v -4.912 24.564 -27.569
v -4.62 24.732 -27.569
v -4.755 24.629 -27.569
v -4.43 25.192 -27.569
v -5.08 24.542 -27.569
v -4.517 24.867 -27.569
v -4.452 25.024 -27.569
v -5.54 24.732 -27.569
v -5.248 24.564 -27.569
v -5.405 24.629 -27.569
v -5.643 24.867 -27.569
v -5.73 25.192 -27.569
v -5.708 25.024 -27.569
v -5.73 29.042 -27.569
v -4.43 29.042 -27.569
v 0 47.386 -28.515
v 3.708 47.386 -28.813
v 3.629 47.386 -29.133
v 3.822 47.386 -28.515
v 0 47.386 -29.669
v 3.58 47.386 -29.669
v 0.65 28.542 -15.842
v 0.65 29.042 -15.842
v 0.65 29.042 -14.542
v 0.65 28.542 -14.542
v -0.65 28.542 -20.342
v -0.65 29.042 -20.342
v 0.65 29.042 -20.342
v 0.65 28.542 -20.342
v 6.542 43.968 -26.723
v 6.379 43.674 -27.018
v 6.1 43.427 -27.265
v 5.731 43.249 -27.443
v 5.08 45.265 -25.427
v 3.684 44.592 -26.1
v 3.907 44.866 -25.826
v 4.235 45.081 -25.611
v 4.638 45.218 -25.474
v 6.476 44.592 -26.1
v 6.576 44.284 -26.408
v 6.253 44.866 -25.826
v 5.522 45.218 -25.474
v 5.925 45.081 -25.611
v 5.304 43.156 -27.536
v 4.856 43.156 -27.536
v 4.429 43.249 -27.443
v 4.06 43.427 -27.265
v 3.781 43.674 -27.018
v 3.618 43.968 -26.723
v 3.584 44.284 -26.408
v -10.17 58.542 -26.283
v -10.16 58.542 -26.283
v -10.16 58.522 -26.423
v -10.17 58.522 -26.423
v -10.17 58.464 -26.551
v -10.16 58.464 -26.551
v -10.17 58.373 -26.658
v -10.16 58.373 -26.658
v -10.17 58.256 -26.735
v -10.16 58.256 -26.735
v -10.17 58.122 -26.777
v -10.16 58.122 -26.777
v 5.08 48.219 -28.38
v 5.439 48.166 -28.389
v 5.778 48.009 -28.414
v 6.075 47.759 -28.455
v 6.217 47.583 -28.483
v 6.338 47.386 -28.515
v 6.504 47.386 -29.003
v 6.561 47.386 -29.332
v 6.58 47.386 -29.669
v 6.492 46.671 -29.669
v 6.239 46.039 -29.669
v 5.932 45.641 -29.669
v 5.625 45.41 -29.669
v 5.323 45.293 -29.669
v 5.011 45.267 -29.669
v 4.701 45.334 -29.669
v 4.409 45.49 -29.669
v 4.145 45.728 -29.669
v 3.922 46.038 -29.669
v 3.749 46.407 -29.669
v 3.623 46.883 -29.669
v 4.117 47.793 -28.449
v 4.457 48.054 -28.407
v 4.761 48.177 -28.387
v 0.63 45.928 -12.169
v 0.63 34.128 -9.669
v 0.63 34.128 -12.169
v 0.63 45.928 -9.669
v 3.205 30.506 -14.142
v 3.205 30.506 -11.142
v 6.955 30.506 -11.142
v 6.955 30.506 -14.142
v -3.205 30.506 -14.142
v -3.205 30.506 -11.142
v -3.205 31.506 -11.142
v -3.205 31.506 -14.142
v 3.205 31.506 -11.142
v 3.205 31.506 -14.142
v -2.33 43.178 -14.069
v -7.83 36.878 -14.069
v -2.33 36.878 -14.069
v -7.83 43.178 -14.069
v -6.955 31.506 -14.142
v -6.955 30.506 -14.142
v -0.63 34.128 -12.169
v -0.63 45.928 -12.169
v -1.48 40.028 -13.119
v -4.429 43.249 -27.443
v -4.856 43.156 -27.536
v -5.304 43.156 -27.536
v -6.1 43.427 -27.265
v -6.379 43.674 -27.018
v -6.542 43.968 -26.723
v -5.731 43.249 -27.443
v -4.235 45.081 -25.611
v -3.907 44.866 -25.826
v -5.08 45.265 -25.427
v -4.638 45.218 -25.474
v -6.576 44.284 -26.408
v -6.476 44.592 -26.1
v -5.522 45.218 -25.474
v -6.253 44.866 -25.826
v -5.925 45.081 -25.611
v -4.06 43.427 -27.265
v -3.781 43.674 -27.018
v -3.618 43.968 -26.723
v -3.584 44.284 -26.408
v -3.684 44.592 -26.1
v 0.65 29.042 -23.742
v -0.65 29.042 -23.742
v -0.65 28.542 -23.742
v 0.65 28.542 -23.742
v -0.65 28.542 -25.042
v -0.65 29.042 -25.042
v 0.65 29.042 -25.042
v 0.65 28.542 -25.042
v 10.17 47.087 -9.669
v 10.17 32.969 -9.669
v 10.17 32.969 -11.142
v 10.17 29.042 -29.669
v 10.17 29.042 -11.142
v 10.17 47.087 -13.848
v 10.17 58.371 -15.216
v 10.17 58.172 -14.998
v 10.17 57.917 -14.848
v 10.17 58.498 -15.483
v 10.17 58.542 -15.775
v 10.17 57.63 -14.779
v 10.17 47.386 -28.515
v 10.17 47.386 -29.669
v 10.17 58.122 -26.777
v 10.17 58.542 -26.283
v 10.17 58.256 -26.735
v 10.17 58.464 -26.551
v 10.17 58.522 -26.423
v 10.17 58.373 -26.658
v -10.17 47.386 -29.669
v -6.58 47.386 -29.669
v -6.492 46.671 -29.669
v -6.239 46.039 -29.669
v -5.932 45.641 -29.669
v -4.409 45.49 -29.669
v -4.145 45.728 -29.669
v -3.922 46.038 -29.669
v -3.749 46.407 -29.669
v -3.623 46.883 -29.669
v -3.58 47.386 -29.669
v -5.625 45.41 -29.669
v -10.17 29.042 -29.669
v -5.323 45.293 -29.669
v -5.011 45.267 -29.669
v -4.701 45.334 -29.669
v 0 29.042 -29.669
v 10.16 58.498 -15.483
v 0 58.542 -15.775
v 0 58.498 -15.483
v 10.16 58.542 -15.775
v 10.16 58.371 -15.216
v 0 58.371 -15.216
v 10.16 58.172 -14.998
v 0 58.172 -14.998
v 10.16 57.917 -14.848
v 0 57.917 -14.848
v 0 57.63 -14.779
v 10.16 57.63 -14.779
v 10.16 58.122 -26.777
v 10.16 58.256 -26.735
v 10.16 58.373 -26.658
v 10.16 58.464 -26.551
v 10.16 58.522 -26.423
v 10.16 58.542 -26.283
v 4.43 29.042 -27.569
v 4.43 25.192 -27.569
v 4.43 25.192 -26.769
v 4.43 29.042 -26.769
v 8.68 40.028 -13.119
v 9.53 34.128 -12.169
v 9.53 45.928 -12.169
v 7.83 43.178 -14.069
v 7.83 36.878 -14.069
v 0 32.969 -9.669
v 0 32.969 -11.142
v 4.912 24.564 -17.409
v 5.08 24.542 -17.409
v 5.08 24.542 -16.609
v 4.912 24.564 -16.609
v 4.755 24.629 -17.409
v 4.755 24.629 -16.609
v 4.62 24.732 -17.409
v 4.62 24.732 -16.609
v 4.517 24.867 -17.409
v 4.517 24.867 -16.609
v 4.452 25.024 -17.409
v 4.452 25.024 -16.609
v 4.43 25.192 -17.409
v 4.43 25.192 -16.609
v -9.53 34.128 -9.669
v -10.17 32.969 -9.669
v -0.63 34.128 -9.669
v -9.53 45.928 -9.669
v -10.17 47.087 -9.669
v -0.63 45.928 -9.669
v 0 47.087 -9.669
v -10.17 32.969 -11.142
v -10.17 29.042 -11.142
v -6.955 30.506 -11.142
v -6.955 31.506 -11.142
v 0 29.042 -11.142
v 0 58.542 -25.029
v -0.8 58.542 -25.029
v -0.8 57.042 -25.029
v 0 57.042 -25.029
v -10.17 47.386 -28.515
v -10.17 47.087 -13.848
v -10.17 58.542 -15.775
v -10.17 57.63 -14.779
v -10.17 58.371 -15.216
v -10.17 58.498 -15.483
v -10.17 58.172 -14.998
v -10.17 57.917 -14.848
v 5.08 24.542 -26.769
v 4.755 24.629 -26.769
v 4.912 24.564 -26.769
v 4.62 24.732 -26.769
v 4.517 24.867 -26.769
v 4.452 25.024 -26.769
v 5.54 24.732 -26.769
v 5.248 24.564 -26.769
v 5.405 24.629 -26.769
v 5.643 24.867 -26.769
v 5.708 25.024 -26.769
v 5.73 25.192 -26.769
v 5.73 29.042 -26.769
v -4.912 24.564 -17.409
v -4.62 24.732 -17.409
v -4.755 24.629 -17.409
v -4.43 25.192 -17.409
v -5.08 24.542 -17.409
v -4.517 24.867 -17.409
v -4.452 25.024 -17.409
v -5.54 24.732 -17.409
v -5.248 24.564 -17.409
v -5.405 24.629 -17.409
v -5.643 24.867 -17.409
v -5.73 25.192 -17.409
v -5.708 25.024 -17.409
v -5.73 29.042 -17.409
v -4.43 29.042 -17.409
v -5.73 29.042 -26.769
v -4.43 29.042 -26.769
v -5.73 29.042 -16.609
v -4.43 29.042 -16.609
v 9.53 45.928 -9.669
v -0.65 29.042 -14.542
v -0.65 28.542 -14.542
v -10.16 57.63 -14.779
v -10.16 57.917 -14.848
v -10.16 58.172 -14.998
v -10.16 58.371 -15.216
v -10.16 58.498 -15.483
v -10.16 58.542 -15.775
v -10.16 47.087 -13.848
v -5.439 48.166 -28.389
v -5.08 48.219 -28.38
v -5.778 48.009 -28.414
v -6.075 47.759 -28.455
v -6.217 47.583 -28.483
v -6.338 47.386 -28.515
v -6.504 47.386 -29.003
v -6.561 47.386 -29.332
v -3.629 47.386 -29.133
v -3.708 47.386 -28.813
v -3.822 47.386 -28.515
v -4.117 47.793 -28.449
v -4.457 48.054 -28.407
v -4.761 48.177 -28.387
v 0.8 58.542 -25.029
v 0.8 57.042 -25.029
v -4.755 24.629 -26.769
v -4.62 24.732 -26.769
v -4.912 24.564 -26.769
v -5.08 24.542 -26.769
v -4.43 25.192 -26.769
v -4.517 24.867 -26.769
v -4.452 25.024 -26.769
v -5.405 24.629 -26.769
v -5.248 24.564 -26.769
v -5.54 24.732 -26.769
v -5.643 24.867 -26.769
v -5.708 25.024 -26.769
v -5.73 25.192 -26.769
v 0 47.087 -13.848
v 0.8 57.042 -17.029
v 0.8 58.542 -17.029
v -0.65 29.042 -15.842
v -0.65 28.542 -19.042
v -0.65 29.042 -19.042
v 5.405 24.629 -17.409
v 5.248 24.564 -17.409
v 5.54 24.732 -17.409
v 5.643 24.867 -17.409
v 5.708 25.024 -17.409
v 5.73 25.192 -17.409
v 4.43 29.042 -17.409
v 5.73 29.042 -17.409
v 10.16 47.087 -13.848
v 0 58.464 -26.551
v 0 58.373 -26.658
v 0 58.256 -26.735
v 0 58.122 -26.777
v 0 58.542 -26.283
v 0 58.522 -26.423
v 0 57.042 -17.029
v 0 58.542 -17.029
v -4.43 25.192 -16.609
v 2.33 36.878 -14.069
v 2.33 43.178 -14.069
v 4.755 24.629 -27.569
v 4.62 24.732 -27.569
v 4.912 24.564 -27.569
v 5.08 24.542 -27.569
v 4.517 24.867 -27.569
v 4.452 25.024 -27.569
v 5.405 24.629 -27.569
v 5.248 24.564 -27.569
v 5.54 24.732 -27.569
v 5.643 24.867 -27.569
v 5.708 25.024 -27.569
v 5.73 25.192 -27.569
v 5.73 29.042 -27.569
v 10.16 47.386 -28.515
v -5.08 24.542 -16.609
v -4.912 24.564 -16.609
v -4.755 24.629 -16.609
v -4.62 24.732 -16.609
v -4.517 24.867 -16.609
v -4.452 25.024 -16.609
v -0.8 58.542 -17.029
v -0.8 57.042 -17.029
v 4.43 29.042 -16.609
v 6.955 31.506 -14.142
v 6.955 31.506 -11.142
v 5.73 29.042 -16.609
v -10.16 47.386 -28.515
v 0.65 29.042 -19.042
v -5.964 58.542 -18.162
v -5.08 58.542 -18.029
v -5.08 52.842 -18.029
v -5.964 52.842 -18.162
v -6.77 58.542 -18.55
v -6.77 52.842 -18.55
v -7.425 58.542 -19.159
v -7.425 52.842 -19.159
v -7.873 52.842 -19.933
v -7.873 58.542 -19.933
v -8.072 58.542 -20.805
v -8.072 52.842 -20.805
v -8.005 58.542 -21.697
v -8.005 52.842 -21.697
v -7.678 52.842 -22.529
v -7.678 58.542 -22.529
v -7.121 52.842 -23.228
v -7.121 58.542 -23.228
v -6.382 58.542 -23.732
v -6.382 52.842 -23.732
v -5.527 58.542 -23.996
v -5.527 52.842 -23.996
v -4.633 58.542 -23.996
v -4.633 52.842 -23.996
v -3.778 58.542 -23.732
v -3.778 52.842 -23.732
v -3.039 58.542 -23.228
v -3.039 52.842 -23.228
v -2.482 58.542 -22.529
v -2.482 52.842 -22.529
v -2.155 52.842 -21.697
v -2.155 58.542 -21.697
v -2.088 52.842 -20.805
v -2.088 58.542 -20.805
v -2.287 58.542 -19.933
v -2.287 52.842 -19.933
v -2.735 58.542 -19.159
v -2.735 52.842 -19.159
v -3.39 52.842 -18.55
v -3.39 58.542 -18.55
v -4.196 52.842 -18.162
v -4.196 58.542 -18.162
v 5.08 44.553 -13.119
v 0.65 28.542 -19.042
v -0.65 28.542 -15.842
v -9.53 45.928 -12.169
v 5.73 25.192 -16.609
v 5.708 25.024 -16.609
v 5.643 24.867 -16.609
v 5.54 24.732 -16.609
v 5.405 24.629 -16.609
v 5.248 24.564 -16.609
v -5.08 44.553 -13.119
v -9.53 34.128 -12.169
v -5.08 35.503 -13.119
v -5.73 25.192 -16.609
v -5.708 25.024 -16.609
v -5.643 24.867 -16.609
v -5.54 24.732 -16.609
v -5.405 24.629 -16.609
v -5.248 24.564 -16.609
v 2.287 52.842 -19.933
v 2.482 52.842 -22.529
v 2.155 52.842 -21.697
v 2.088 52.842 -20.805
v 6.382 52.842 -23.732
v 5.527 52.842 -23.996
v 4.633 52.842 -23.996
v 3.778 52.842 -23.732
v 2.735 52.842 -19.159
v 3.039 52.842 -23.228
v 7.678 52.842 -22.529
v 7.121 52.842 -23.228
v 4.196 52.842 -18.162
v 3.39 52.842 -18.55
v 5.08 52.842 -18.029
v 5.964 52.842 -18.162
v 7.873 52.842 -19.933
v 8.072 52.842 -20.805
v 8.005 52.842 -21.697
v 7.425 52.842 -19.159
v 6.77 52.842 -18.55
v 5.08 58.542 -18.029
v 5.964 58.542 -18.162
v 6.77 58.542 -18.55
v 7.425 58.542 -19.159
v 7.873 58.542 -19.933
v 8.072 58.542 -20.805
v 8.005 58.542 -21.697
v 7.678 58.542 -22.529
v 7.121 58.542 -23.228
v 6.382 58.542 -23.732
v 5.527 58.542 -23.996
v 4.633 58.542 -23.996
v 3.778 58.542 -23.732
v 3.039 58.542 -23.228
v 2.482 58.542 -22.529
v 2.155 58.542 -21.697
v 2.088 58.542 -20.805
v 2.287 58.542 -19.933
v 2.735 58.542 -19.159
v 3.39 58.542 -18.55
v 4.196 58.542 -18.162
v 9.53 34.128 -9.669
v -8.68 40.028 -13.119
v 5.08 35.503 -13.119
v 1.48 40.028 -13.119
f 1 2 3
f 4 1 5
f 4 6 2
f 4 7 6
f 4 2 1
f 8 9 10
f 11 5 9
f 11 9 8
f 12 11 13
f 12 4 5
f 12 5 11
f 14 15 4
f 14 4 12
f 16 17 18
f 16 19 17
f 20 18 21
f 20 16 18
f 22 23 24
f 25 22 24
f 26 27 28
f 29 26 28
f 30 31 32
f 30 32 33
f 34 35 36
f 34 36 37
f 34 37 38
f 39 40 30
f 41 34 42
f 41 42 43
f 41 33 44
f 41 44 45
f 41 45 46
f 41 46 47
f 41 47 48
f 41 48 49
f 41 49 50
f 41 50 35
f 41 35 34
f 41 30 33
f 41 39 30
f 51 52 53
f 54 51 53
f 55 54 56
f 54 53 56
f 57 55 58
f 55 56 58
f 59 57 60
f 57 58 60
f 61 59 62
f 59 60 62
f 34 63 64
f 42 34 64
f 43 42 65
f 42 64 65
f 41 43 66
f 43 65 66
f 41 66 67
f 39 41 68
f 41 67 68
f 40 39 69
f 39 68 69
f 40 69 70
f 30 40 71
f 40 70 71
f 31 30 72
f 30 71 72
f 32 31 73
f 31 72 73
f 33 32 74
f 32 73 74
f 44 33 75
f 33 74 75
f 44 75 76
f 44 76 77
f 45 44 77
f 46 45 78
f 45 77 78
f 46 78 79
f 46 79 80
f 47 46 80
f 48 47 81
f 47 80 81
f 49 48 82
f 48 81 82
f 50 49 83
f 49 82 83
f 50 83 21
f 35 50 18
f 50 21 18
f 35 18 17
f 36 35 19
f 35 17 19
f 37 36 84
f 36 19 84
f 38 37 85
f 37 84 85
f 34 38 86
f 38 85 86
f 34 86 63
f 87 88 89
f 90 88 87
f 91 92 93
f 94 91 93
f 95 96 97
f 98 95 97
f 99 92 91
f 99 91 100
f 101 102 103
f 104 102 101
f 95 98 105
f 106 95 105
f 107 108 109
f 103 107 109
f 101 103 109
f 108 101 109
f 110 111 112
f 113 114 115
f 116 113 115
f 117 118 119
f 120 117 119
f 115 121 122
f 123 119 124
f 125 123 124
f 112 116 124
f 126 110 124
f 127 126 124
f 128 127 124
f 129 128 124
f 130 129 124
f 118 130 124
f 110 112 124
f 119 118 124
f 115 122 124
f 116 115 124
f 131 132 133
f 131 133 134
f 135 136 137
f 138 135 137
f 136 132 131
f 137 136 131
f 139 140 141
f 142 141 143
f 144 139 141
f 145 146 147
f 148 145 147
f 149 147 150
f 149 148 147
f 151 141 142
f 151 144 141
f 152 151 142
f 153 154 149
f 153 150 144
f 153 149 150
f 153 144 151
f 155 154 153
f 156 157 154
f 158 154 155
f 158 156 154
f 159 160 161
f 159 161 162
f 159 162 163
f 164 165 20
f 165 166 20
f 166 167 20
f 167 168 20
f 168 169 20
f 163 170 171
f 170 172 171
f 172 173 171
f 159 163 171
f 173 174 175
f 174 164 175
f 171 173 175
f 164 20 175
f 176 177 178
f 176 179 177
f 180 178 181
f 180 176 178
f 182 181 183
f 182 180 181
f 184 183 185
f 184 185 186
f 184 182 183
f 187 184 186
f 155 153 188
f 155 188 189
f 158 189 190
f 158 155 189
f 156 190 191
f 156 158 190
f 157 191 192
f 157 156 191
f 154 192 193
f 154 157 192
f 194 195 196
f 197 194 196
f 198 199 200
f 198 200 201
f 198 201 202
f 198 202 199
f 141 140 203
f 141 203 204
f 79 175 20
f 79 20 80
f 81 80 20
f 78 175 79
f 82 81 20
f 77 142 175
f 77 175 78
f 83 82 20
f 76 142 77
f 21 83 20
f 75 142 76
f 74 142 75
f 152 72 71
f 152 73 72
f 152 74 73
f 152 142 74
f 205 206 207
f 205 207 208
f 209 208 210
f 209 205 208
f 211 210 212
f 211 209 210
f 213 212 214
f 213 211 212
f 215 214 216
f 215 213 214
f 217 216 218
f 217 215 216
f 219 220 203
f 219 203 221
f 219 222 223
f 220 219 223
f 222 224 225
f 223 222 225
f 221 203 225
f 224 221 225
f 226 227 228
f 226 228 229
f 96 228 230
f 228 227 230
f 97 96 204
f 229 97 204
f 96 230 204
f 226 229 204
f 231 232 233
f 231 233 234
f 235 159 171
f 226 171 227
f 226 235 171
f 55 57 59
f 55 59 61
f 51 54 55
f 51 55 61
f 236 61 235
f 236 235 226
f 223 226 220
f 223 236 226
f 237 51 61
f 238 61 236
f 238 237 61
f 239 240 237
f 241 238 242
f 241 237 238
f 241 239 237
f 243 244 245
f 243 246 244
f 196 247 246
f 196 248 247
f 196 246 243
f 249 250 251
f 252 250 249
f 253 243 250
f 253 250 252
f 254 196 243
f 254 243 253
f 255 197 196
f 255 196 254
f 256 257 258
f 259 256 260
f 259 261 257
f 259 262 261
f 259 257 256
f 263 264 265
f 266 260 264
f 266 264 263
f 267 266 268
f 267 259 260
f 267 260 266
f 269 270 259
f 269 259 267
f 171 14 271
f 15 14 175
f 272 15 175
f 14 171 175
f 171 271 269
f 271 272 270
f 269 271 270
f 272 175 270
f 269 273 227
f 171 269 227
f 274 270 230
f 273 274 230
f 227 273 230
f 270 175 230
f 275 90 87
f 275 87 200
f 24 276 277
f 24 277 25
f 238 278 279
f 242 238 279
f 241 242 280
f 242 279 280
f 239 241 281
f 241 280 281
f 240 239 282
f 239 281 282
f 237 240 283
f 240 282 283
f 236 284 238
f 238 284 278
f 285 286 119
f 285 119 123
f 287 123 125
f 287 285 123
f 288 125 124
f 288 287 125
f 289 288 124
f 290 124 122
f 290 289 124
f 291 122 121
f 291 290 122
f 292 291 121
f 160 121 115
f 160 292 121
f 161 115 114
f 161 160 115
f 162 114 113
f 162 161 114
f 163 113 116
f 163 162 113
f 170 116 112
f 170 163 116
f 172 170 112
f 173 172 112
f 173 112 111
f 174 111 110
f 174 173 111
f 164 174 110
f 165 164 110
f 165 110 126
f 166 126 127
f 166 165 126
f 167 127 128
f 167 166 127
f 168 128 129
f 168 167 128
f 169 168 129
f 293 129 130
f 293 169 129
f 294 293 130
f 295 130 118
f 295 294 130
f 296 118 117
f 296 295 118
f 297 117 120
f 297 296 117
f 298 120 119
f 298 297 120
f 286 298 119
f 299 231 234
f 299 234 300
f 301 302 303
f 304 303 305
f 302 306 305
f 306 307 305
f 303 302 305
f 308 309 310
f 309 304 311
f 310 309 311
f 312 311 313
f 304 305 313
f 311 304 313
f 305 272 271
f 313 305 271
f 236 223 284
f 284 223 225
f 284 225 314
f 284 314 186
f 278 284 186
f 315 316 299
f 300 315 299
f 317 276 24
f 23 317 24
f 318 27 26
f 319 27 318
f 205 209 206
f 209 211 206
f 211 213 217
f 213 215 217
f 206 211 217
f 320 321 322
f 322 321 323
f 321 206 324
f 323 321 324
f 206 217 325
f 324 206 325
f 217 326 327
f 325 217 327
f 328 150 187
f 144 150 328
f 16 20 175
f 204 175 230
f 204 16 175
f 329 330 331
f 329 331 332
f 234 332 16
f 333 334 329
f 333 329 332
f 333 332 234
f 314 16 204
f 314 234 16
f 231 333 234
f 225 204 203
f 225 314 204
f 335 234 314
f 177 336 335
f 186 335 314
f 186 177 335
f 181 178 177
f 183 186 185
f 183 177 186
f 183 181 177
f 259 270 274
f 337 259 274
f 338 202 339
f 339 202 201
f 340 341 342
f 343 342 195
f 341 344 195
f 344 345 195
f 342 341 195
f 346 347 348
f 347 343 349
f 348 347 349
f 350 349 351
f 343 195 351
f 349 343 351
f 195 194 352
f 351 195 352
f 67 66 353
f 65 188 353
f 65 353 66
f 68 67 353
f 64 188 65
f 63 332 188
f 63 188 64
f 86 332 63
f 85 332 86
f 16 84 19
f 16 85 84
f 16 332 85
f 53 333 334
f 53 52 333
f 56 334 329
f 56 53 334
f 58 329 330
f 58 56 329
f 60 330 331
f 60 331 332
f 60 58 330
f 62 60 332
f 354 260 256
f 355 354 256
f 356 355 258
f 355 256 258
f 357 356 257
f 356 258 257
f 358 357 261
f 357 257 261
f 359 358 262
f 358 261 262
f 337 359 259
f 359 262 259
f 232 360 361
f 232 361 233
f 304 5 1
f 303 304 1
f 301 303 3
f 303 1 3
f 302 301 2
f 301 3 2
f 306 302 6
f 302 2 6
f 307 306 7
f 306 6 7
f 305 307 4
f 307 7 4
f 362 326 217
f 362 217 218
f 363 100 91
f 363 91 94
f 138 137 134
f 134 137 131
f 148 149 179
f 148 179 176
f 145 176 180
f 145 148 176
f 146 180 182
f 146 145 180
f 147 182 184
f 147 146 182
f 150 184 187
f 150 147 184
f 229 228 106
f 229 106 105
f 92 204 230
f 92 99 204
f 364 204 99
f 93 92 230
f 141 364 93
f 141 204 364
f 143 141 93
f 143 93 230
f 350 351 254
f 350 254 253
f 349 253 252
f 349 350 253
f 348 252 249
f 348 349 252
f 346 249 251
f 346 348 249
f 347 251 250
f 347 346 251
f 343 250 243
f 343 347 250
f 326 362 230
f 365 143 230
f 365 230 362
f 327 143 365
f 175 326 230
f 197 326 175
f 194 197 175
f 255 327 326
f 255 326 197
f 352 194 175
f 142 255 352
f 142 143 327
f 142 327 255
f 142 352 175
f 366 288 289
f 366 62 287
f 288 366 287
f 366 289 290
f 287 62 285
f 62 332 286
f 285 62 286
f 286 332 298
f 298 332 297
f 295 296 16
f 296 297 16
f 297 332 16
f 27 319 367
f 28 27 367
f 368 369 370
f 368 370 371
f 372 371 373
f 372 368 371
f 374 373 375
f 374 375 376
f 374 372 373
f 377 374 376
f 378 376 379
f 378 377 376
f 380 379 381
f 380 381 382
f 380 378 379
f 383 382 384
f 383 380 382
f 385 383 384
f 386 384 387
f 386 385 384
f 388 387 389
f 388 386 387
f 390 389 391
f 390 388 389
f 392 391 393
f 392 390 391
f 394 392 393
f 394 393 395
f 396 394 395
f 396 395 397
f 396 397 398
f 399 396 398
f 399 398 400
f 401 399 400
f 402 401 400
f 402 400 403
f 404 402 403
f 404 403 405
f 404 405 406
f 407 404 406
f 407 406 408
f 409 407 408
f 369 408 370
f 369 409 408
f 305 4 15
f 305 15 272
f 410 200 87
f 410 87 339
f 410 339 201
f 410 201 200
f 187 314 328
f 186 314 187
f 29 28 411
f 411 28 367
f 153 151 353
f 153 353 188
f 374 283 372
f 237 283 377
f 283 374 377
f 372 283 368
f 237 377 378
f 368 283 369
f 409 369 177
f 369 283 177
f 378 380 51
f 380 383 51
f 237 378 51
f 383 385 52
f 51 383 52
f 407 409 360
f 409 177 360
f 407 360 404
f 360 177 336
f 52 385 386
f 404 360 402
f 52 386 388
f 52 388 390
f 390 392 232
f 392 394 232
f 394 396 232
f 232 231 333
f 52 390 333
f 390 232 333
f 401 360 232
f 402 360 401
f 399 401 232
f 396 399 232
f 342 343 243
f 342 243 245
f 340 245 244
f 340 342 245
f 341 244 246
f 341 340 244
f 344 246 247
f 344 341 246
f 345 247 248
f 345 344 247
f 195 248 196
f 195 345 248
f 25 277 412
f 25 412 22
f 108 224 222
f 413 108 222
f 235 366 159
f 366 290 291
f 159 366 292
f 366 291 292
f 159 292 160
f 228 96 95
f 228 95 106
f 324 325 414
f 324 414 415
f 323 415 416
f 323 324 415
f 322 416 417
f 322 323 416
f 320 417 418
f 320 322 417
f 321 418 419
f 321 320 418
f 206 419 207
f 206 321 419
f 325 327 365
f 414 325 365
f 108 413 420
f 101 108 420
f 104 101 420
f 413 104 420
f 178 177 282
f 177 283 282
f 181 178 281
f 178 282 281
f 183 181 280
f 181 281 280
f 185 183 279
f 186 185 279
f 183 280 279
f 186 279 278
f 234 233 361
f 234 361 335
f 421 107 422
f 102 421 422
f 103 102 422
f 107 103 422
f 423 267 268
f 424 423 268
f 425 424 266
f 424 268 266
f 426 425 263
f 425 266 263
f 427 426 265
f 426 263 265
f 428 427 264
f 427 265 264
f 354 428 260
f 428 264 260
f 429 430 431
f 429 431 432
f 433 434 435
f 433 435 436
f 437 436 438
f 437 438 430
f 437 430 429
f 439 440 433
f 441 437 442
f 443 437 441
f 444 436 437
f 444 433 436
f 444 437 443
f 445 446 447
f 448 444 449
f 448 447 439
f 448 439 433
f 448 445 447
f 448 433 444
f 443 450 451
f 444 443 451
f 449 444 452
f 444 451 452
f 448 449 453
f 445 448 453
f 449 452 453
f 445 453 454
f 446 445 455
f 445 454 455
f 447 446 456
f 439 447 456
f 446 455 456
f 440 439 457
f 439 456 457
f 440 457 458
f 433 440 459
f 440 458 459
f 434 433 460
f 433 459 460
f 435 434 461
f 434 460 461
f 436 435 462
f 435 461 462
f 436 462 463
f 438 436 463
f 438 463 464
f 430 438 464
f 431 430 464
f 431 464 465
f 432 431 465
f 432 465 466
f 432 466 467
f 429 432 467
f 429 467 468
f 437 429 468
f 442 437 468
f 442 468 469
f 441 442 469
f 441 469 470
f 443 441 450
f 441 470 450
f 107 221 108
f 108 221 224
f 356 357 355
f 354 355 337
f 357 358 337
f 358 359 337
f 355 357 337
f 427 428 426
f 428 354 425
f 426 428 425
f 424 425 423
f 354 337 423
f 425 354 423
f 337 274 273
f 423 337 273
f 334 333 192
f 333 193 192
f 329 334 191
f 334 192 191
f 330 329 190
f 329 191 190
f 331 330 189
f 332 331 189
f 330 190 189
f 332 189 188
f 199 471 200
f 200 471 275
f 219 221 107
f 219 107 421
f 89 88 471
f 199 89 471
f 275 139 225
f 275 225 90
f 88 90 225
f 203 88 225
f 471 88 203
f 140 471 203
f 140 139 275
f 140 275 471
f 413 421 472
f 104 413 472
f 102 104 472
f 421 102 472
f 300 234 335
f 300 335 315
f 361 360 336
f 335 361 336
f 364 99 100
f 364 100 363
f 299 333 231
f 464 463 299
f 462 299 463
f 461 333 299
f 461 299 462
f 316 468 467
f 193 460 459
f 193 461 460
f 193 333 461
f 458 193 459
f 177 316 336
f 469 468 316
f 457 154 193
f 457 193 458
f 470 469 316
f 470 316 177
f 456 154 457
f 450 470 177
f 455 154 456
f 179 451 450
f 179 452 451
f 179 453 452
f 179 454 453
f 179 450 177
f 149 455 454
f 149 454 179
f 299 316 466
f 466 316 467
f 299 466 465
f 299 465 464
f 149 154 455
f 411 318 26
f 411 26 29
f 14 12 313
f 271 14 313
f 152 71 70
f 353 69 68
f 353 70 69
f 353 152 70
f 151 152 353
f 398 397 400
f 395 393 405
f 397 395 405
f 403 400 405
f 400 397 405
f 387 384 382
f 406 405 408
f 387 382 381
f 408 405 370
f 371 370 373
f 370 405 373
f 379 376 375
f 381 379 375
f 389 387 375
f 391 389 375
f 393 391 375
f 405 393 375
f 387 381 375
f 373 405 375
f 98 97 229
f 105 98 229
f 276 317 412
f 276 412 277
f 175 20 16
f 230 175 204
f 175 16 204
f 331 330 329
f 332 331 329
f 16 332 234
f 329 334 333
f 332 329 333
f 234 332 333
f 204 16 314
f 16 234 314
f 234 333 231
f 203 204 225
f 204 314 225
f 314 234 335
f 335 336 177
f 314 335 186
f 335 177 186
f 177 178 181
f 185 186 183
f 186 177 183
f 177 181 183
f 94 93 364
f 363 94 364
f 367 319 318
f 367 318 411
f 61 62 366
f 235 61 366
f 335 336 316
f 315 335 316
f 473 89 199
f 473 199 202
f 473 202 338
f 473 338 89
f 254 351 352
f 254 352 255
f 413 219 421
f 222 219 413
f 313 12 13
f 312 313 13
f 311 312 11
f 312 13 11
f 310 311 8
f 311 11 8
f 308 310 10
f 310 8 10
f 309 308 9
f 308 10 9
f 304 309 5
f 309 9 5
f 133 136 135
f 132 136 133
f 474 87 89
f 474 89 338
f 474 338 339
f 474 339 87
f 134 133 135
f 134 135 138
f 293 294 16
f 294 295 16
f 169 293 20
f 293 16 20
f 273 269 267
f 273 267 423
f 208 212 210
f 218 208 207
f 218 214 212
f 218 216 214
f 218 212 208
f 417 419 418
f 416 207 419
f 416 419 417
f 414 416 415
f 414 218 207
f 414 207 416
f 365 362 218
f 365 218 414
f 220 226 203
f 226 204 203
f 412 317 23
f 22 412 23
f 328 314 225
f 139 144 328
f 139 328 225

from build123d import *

# Parameters (mm, degrees)
BOSS_EXTRUDE1_DEPTH   = 10.16
SKETCH2_W             = 8.9
SKETCH2_H             = 11.8
CUT_EXTRUDE1_DEPTH    = 2.5
FILLET1_R             = 0.5
FILLET2_R             = 1
SKETCH5_R             = 3
CUT_EXTRUDE2_DEPTH    = 5.7
SKETCH7_W             = 1.3
SKETCH7_H             = 0.8
BOSS_EXTRUDE2_DEPTH   = 4.5
CUT_EXTRUDE5_START    = -10.96
CUT_EXTRUDE5_DEPTH    = 10.96
SKETCH10_R            = 1.5
CUT_EXTRUDE6_DEPTH    = 4.5
SKETCH13_W            = 3.75
SKETCH13_H            = 1
CUT_EXTRUDE8_DEPTH    = 3
SKETCH11_W            = 1.6
SKETCH11_H            = 8
CUT_EXTRUDE7_DEPTH    = 1.5
SKETCH12_W            = 1.3
SKETCH12_H            = 1.3
BOSS_EXTRUDE3_DEPTH   = 0.5
BOSS_EXTRUDE3_2_DEPTH = 0.5
BOSS_EXTRUDE3_3_DEPTH = 0.5
BOSS_EXTRUDE4_START   = 0.01
BOSS_EXTRUDE4_DEPTH   = 0.01
BOSS_EXTRUDE5_DEPTH   = 0.01


# Read off the part's stored shape, not the designer's step: Cut-Extrude5
with BuildPart() as part:
    # Sketch1 → Boss-Extrude1 (new body)
    with BuildSketch(Plane(origin=(0, 0, 0), x_dir=(0, 0, -1), z_dir=(1, 0, 0))):
        Polygon((9.66921347, 32.969152597), (9.66921347, 47.086783372), (13.84750154, 47.086783372), (14.859335014, 58.541856165), (26.70903057, 58.541856165), (28.514863985, 47.386490611), (29.66921347, 47.386490611), (29.66921347, 29.041856165), (11.142277404, 29.041856165), (11.142277404, 32.969152597), align=None)
    extrude(amount=BOSS_EXTRUDE1_DEPTH)

    # Sketch2 → Cut-Extrude1 (cut)
    with BuildSketch(Plane.XY.offset(-9.66921347)):
        with Locations((5.08, 40.027967985)):
            Rectangle(SKETCH2_W, SKETCH2_H)
    extrude(amount=-CUT_EXTRUDE1_DEPTH, mode=Mode.SUBTRACT)

    # Sketch3 → Cut-Loft1 section 0
    with BuildSketch(Plane.XY.offset(-12.16921347)):
        with BuildLine():
            Line((9.53, 34.127967985), (9.53, 45.927967985))
            Line((9.53, 45.927967985), (0.63, 45.927967985))
            Line((0.63, 45.927967985), (0.63, 34.127967985))
            Line((0.63, 34.127967985), (9.53, 34.127967985))
        make_face()
    # Sketch4 → Cut-Loft1 section 1
    with BuildSketch(Plane.XY.offset(-14.06921347)):
        with BuildLine():
            Line((2.33, 36.877967985), (7.83, 36.877967985))
            Line((7.83, 36.877967985), (7.83, 43.177967985))
            Line((7.83, 43.177967985), (2.33, 43.177967985))
            Line((2.33, 43.177967985), (2.33, 36.877967985))
        make_face()
    loft(mode=Mode.SUBTRACT)

    # Fillet1
    fillet1_edges = [part.edges().sort_by_distance(p)[0] for p in [
        (5.08, 58.541856165, -26.70903057),
    ]]
    fillet(fillet1_edges, radius=FILLET1_R)

    # Fillet2
    fillet2_edges = [part.edges().sort_by_distance(p)[0] for p in [
        (5.08, 58.541856165, -14.859335014),
    ]]
    fillet(fillet2_edges, radius=FILLET2_R)

    # Sketch5 → Cut-Extrude2 (cut)
    with BuildSketch(Plane(origin=(0, 58.541856165, 0), x_dir=(1, 0, 0), z_dir=(0, 1, 0))):
        with Locations(Location((5.08, 21.02917987, 0), (0, 0, 270))):
            Circle(SKETCH5_R)
    extrude(amount=-CUT_EXTRUDE2_DEPTH, mode=Mode.SUBTRACT)

    # Sketch7 → Boss-Extrude2 (add)
    with BuildSketch(Plane.XZ.offset(-29.041856165)):
        with Locations((5.08, -27.16921347)):
            Rectangle(SKETCH7_W, SKETCH7_H)
        with Locations((5.08, -17.00921347)):
            Rectangle(SKETCH7_W, SKETCH7_H)
    extrude(amount=BOSS_EXTRUDE2_DEPTH)

    # Cut-Extrude5 outline → Cut-Extrude5 (cut)
    with BuildSketch(Plane.XY.offset(-16.60921347).offset(CUT_EXTRUDE5_START)):
        with BuildLine():
            Line((5.73, 24.541856165), (5.73, 25.191856165))
            ThreePointArc((5.73, 25.191856165), (5.539619408, 24.732236757), (5.08, 24.541856165))
            Line((5.08, 24.541856165), (5.73, 24.541856165))
        make_face()
        with BuildLine():
            Line((4.43, 24.541856165), (5.08, 24.541856165))
            ThreePointArc((5.08, 24.541856165), (4.620380592, 24.732236757), (4.43, 25.191856165))
            Line((4.43, 25.191856165), (4.43, 24.541856165))
        make_face()
    extrude(amount=CUT_EXTRUDE5_DEPTH, mode=Mode.SUBTRACT)

    # Sketch10 → Cut-Extrude6 (cut)
    with BuildSketch(Plane(origin=(0, 38.527852041, -38.527852041), x_dir=(-1, 0, 0), z_dir=(0, 0.7071067811865488, -0.7071067811865464))):
        with Locations(Location((-5.08, 12.52800681, 0), (0, 0, 90))):
            Circle(SKETCH10_R)
    extrude(amount=-CUT_EXTRUDE6_DEPTH, mode=Mode.SUBTRACT)

    # Sketch13 → Cut-Extrude8 (cut)
    with BuildSketch(Plane.XY.offset(-11.142277404)):
        with Locations((5.08, 31.005504381)):
            Rectangle(SKETCH13_W, SKETCH13_H)
    extrude(amount=-CUT_EXTRUDE8_DEPTH, mode=Mode.SUBTRACT)


with BuildPart() as body_2:
    # Mirror2: mirrored copy
    add(part.part.mirror(Plane.ZY))


with BuildPart() as cut_extrude7_tool:
    # Sketch11 → Cut-Extrude7 (new body)
    with BuildSketch(Plane(origin=(0, 58.541856165, 0), x_dir=(1, 0, 0), z_dir=(0, 1, 0))):
        with Locations((0, 21.02917987)):
            Rectangle(SKETCH11_W, SKETCH11_H)
    extrude(amount=-CUT_EXTRUDE7_DEPTH)


with BuildPart() as part_1:
    add(part.part)

    # Cut-Extrude7: cut by cut_extrude7_tool
    add(cut_extrude7_tool.part, mode=Mode.SUBTRACT)

    # Sketch14 → Boss-Extrude4 (add)
    with BuildSketch(Plane(origin=(10.16, 0, 0), x_dir=(0, 0, -1), z_dir=(1, 0, 0)).offset(BOSS_EXTRUDE4_START)):
        with BuildLine():
            Line((26.28346176, 58.541856165), (15.77489798, 58.541856165))
            ThreePointArc((15.77489798, 58.541856165), (15.099615822, 58.279415659), (14.778776447, 57.629844179))
            Line((14.778776447, 57.629844179), (13.84750154, 47.086783372))
            Line((13.84750154, 47.086783372), (9.66921347, 47.086783372))
            Line((9.66921347, 47.086783372), (9.66921347, 32.969152597))
            Line((9.66921347, 32.969152597), (11.142277404, 32.969152597))
            Line((11.142277404, 32.969152597), (11.142277404, 29.041856165))
            Line((11.142277404, 29.041856165), (29.66921347, 29.041856165))
            Line((29.66921347, 29.041856165), (29.66921347, 47.386490611))
            Line((29.66921347, 47.386490611), (28.514863985, 47.386490611))
            Line((28.514863985, 47.386490611), (26.777036465, 58.121756163))
            ThreePointArc((26.777036465, 58.121756163), (26.607537368, 58.422611991), (26.28346176, 58.541856165))
        make_face()
    extrude(amount=-BOSS_EXTRUDE4_DEPTH)


with BuildPart() as body_2_1:
    add(body_2.part)

    # Cut-Extrude7: cut by cut_extrude7_tool
    add(cut_extrude7_tool.part, mode=Mode.SUBTRACT)

    # Sketch15 → Boss-Extrude5 (add)
    with BuildSketch(Plane.ZY.offset(10.16)):
        with BuildLine():
            Line((-15.77489798, 58.541856165), (-26.28346176, 58.541856165))
            ThreePointArc((-26.28346176, 58.541856165), (-26.607537368, 58.422611991), (-26.777036465, 58.121756163))
            Line((-26.777036465, 58.121756163), (-28.514863985, 47.386490611))
            Line((-28.514863985, 47.386490611), (-29.66921347, 47.386490611))
            Line((-29.66921347, 47.386490611), (-29.66921347, 29.041856165))
            Line((-29.66921347, 29.041856165), (-11.142277404, 29.041856165))
            Line((-11.142277404, 29.041856165), (-11.142277404, 32.969152597))
            Line((-11.142277404, 32.969152597), (-9.66921347, 32.969152597))
            Line((-9.66921347, 32.969152597), (-9.66921347, 47.086783372))
            Line((-9.66921347, 47.086783372), (-13.84750154, 47.086783372))
            Line((-13.84750154, 47.086783372), (-14.778776447, 57.629844179))
            ThreePointArc((-14.778776447, 57.629844179), (-15.099615822, 58.279415659), (-15.77489798, 58.541856165))
        make_face()
    extrude(amount=BOSS_EXTRUDE5_DEPTH)


with BuildPart() as body_3:
    # Sketch12 → Boss-Extrude3 (new body)
    with BuildSketch(Plane.XZ.offset(-29.041856165)):
        with Locations((0, -15.192277404)):
            Rectangle(SKETCH12_W, SKETCH12_H)
    extrude(amount=BOSS_EXTRUDE3_DEPTH)


with BuildPart() as body_4:
    # Sketch12 → Boss-Extrude3 2 (new body)
    with BuildSketch(Plane.XZ.offset(-29.041856165)):
        with Locations((0, -19.692277404)):
            Rectangle(SKETCH12_W, SKETCH12_H)
    extrude(amount=BOSS_EXTRUDE3_2_DEPTH)


with BuildPart() as body_5:
    # Sketch12 → Boss-Extrude3 3 (new body)
    with BuildSketch(Plane.XZ.offset(-29.041856165)):
        with Locations((0, -24.392277404)):
            Rectangle(SKETCH12_W, SKETCH12_H)
    extrude(amount=BOSS_EXTRUDE3_3_DEPTH)


solid = Compound([part_1.part, body_2_1.part, body_3.part, body_4.part, body_5.part])
